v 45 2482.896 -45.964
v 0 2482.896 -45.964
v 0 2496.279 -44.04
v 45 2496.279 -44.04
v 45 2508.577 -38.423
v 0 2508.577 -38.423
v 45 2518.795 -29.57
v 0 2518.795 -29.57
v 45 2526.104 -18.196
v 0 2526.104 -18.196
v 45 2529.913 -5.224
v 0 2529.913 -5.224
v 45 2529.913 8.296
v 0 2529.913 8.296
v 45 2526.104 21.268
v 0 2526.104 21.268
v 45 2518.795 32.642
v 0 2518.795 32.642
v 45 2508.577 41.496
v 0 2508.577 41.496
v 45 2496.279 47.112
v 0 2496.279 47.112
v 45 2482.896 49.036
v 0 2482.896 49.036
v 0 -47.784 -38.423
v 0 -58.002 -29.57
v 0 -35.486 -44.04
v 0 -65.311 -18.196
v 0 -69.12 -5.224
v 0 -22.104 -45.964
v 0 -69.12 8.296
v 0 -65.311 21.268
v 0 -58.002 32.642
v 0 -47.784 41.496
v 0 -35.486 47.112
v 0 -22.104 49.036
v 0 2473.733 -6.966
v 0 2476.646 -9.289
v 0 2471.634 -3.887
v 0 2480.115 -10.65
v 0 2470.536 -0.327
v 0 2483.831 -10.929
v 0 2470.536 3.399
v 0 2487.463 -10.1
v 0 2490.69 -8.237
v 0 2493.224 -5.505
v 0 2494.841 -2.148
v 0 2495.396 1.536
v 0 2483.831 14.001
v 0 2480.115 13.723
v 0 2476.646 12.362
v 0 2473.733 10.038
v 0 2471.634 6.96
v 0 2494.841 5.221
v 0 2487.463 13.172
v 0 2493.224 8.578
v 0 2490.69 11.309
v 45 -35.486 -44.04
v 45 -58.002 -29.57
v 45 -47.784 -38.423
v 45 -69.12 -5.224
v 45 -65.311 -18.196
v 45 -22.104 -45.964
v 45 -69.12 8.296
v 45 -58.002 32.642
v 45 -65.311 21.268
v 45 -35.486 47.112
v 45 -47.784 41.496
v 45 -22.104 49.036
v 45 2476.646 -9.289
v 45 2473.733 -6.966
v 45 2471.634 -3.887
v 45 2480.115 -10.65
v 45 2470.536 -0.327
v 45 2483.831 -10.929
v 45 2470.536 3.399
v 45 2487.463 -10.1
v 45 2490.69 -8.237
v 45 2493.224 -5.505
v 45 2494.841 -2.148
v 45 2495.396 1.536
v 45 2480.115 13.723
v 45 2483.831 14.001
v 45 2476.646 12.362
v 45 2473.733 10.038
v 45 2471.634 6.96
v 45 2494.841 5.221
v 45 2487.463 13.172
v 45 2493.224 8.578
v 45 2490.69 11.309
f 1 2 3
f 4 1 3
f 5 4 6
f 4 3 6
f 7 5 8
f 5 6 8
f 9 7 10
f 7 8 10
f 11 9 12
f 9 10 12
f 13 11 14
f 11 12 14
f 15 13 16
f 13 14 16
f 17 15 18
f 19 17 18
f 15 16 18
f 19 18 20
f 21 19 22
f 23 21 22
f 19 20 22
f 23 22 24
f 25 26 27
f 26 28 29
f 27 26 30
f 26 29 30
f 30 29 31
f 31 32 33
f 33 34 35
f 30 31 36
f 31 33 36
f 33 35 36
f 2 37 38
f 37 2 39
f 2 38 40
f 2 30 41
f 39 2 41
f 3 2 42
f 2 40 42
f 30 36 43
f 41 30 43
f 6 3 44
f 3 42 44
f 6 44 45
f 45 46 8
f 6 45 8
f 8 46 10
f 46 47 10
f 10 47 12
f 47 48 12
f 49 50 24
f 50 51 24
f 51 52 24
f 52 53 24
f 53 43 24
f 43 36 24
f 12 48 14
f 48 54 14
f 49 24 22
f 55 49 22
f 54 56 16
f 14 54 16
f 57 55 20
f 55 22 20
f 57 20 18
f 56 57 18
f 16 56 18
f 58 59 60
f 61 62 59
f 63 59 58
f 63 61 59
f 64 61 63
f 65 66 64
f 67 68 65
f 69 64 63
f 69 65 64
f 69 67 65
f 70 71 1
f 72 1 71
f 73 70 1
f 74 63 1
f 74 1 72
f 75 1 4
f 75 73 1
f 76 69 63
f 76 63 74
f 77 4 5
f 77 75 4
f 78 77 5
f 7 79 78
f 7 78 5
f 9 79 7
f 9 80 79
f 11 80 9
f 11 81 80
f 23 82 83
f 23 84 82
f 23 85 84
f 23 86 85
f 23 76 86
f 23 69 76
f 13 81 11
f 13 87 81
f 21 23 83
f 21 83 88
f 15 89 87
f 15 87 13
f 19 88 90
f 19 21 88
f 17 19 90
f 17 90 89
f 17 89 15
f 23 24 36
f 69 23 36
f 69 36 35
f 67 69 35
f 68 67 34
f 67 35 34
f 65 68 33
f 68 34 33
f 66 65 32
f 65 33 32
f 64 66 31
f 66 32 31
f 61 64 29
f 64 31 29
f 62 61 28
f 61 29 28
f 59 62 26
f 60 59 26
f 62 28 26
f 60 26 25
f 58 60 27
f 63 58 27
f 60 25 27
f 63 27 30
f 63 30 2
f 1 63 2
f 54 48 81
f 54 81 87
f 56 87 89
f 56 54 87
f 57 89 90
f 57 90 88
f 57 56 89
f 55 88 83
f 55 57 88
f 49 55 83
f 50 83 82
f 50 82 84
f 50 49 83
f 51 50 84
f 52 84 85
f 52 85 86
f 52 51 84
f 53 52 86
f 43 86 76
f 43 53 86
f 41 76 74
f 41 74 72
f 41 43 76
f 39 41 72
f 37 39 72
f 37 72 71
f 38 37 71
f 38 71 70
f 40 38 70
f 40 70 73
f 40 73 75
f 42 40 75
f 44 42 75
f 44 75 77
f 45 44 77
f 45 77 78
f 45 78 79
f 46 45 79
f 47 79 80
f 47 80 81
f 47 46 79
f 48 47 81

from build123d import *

# Parameters (mm, degrees)
F0_R     = 12.5
F1_DEPTH = 45


with BuildPart() as f1:
    # F0 (on Right) → F1 (new body)
    with BuildSketch(Plane.YZ):
        with BuildLine():
            Line((2482.896477, 49.036183), (-22.103523, 49.036183))
            ThreePointArc((-22.103523, 49.036183), (-69.603523, 1.536183), (-22.103523, -45.963817))
            Line((-22.103523, -45.963817), (2482.896477, -45.963817))
            ThreePointArc((2482.896477, -45.963817), (2530.396477, 1.536183), (2482.896477, 49.036183))
        make_face()
        with Locations((2482.896477, 1.536183)):
            Circle(F0_R, mode=Mode.SUBTRACT)
    extrude(amount=F1_DEPTH)


solid = f1.part
